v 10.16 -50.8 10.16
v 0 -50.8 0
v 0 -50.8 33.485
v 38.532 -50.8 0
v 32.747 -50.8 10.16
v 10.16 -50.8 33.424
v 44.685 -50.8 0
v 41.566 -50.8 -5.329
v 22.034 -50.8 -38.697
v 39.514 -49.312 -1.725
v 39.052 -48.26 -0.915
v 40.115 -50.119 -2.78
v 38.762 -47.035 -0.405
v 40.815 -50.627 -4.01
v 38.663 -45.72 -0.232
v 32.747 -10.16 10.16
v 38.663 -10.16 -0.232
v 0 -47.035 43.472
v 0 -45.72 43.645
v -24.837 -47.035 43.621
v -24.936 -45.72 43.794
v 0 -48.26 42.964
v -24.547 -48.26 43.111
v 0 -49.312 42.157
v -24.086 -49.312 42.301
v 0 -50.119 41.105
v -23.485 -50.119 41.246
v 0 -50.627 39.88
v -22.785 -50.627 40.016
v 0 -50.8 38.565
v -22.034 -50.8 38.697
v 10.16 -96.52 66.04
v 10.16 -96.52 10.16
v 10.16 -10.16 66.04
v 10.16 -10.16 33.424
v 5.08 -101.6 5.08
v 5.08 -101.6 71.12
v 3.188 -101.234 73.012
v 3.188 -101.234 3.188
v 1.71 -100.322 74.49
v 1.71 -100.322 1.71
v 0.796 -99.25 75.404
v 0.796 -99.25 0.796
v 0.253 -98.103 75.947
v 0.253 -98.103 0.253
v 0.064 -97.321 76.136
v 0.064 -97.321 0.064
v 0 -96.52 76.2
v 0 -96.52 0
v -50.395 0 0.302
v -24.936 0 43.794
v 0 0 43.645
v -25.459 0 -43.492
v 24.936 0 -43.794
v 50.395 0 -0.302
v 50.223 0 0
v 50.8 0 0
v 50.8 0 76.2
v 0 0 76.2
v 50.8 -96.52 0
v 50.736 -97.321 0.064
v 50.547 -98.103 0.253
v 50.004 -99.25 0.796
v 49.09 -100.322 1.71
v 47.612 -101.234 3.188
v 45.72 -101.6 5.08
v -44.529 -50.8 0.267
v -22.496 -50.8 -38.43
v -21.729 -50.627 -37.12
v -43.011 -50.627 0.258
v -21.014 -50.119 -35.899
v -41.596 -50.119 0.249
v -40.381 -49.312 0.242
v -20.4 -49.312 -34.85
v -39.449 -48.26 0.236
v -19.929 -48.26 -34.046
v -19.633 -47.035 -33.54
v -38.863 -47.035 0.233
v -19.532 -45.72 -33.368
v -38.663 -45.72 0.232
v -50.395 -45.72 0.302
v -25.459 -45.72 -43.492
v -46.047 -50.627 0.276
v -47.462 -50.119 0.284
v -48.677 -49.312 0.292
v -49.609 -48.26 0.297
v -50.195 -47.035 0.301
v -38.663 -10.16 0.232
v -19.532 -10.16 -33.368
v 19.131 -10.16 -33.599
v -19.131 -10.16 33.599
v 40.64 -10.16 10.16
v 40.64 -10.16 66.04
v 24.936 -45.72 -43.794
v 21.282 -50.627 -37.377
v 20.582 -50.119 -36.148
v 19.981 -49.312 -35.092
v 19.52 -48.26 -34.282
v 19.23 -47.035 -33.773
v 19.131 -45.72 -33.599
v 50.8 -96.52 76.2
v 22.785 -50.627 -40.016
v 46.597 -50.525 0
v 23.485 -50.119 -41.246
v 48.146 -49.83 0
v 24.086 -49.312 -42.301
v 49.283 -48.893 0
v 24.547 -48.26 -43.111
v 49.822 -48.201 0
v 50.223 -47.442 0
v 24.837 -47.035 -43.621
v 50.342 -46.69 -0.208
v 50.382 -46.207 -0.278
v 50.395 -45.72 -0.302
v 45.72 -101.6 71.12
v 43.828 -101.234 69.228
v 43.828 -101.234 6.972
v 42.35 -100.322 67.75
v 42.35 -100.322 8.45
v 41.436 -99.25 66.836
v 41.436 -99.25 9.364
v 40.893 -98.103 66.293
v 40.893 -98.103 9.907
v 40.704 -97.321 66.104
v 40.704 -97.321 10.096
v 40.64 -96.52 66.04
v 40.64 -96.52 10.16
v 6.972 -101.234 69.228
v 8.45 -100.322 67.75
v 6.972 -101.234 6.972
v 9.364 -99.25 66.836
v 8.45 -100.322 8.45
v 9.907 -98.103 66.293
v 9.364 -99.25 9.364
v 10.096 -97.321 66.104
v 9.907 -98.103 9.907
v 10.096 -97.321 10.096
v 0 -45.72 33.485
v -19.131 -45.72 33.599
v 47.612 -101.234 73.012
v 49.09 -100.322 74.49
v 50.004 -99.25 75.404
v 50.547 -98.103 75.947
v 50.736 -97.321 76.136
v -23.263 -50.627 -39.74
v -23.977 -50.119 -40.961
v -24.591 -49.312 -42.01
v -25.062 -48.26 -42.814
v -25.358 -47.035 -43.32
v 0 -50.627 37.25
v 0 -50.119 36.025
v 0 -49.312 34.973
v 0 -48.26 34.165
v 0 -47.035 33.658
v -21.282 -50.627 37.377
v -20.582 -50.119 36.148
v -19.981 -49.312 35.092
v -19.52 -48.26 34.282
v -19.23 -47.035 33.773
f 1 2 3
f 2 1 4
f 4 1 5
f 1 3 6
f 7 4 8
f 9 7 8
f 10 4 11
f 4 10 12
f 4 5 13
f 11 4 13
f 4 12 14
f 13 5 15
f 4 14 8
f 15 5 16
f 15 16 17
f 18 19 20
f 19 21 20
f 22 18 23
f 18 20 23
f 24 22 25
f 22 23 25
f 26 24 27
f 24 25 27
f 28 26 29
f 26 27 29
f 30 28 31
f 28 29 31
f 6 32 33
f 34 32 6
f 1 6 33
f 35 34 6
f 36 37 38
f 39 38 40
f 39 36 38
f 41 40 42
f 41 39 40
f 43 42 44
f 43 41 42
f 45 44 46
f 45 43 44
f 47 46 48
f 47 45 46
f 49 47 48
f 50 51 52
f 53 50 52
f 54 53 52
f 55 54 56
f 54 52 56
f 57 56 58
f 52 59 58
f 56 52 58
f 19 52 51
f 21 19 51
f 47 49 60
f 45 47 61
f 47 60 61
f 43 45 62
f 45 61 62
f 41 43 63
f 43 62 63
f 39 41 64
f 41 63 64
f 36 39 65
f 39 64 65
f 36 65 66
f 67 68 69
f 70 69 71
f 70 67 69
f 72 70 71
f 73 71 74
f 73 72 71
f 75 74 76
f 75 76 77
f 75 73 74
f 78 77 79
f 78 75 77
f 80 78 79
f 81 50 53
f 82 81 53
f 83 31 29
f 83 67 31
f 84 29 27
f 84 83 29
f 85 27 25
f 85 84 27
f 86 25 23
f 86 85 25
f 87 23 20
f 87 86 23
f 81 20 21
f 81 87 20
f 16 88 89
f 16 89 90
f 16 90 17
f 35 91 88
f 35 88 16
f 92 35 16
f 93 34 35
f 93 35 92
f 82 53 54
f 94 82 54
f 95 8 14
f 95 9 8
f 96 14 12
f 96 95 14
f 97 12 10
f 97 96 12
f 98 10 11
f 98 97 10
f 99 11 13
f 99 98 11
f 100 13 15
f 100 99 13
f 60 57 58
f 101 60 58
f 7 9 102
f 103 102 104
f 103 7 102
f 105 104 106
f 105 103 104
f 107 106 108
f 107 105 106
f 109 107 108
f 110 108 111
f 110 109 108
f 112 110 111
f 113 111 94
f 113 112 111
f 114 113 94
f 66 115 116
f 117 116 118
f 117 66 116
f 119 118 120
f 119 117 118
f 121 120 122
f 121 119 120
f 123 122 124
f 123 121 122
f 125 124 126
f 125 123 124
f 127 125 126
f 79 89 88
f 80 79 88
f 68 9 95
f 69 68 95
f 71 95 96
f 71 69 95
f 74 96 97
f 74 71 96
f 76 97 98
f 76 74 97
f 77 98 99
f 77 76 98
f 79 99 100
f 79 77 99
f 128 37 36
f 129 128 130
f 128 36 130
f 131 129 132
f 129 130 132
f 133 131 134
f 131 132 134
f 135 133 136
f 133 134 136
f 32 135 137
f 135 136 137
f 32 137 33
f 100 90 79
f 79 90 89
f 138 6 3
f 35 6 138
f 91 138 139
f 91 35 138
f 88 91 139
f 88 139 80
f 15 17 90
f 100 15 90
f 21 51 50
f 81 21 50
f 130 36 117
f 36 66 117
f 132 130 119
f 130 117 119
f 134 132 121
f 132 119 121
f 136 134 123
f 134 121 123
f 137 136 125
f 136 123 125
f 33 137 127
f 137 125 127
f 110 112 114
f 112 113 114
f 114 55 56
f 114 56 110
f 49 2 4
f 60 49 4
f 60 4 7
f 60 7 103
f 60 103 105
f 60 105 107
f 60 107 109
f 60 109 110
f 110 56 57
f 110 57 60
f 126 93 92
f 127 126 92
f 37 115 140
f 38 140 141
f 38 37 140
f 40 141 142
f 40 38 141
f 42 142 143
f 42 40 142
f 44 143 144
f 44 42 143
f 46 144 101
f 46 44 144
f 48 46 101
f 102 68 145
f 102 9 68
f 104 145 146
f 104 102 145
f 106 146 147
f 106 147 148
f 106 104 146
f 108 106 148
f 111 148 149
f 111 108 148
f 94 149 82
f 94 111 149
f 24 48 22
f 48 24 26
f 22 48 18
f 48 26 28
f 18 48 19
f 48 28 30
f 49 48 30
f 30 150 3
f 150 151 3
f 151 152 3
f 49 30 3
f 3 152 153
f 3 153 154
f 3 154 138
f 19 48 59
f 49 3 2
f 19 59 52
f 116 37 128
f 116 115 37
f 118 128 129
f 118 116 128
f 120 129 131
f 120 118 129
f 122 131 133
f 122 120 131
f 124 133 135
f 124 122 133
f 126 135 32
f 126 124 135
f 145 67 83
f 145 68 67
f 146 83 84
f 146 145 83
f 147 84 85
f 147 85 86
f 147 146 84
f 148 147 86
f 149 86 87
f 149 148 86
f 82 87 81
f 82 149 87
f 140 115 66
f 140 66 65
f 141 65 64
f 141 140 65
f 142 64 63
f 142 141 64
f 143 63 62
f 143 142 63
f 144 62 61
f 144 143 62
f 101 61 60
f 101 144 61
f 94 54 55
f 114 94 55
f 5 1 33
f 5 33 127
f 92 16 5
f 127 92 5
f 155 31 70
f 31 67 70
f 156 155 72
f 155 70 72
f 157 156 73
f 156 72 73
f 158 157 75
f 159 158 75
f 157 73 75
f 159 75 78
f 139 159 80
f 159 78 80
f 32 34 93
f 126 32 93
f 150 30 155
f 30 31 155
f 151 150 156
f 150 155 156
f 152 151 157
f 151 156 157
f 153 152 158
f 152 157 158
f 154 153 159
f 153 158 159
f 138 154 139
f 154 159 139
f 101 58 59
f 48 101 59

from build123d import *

# Parameters (mm, degrees)
F1_DEPTH = 101.6
F2_DEPTH = 50.8
F3_T     = -10.16
F4_R     = 5.07999


# Not quite as in the source:
# - a fillet or chamfer is up to 0.001 mm smaller than in the source, because OpenCascade refuses the exact size


with BuildPart() as f1:
    # F0 (on Front) → F1 (new body)
    with BuildSketch(Plane.XZ):
        Polygon((0, 43.6448735309), (0, 0), (50.223051581, 0), (50.8, 0), (50.8, 76.2), (0, 76.2), align=None)
    extrude(amount=F1_DEPTH)

    # F0 (on Front) → F2 (join)
    with BuildSketch(Plane.XZ):
        Polygon((50.223051581, 0), (0, 0), (0, 43.6448735309), (-24.9360222917, 43.7942571525), (-50.3949503798, 0.3018998023), (-25.4589280881, -43.4923573502), (24.9360222917, -43.7942571525), (50.3949503798, -0.3018998023), align=None)
    extrude(amount=F2_DEPTH)

    # F3: a shell. OpenCascade refuses it in one call, so the cavity is built on its own and cut out:
    # the body offset inwards by the wall thickness, plus a prism from it out through each open face.
    f3_core = offset(f1.part, amount=F3_T, kind=Kind.INTERSECTION, mode=Mode.PRIVATE)
    f3_exits = [f3_core.faces().sort_by_distance(p)[0] for p in [
        (25.4, -91.44, 38.1),
        (-1.965126, -40.64, -2.131269),
    ]]
    add(f3_core, mode=Mode.SUBTRACT)
    extrude(f3_exits, amount=-F3_T, mode=Mode.SUBTRACT)

    # F4 (radius 5.08 in the source; OpenCascade refuses exactly that, so slightly less here)
    f4_edges = [f1.edges().sort_by_distance(p)[0] for p in [
        (25.4, -101.6, 66.04),
        (40.64, -101.6, 38.1),
        (25.4, -101.6, 10.16),
        (10.16, -101.6, 38.1),
        (-28.897258, -50.8, 16.91546),
        (-29.097847, -50.8, -16.56803),
        (-0.200589, -50.8, -33.48349),
        (28.897258, -50.8, -16.91546),
        (-12.468011, -50.8, 43.719565),
        (-37.665486, -50.8, 22.048078),
        (-37.926939, -50.8, -21.595229),
        (-0.261453, -50.8, -43.643307),
        (37.665486, -50.8, -22.048078),
        (0, -101.6, 38.1),
        (25.4, -101.6, 76.2),
        (50.8, -101.6, 38.1),
        (25.4, -101.6, 0),
        (-9.565556, -50.8, 33.541995),
    ]]
    fillet(f4_edges, radius=F4_R)


solid = f1.part
